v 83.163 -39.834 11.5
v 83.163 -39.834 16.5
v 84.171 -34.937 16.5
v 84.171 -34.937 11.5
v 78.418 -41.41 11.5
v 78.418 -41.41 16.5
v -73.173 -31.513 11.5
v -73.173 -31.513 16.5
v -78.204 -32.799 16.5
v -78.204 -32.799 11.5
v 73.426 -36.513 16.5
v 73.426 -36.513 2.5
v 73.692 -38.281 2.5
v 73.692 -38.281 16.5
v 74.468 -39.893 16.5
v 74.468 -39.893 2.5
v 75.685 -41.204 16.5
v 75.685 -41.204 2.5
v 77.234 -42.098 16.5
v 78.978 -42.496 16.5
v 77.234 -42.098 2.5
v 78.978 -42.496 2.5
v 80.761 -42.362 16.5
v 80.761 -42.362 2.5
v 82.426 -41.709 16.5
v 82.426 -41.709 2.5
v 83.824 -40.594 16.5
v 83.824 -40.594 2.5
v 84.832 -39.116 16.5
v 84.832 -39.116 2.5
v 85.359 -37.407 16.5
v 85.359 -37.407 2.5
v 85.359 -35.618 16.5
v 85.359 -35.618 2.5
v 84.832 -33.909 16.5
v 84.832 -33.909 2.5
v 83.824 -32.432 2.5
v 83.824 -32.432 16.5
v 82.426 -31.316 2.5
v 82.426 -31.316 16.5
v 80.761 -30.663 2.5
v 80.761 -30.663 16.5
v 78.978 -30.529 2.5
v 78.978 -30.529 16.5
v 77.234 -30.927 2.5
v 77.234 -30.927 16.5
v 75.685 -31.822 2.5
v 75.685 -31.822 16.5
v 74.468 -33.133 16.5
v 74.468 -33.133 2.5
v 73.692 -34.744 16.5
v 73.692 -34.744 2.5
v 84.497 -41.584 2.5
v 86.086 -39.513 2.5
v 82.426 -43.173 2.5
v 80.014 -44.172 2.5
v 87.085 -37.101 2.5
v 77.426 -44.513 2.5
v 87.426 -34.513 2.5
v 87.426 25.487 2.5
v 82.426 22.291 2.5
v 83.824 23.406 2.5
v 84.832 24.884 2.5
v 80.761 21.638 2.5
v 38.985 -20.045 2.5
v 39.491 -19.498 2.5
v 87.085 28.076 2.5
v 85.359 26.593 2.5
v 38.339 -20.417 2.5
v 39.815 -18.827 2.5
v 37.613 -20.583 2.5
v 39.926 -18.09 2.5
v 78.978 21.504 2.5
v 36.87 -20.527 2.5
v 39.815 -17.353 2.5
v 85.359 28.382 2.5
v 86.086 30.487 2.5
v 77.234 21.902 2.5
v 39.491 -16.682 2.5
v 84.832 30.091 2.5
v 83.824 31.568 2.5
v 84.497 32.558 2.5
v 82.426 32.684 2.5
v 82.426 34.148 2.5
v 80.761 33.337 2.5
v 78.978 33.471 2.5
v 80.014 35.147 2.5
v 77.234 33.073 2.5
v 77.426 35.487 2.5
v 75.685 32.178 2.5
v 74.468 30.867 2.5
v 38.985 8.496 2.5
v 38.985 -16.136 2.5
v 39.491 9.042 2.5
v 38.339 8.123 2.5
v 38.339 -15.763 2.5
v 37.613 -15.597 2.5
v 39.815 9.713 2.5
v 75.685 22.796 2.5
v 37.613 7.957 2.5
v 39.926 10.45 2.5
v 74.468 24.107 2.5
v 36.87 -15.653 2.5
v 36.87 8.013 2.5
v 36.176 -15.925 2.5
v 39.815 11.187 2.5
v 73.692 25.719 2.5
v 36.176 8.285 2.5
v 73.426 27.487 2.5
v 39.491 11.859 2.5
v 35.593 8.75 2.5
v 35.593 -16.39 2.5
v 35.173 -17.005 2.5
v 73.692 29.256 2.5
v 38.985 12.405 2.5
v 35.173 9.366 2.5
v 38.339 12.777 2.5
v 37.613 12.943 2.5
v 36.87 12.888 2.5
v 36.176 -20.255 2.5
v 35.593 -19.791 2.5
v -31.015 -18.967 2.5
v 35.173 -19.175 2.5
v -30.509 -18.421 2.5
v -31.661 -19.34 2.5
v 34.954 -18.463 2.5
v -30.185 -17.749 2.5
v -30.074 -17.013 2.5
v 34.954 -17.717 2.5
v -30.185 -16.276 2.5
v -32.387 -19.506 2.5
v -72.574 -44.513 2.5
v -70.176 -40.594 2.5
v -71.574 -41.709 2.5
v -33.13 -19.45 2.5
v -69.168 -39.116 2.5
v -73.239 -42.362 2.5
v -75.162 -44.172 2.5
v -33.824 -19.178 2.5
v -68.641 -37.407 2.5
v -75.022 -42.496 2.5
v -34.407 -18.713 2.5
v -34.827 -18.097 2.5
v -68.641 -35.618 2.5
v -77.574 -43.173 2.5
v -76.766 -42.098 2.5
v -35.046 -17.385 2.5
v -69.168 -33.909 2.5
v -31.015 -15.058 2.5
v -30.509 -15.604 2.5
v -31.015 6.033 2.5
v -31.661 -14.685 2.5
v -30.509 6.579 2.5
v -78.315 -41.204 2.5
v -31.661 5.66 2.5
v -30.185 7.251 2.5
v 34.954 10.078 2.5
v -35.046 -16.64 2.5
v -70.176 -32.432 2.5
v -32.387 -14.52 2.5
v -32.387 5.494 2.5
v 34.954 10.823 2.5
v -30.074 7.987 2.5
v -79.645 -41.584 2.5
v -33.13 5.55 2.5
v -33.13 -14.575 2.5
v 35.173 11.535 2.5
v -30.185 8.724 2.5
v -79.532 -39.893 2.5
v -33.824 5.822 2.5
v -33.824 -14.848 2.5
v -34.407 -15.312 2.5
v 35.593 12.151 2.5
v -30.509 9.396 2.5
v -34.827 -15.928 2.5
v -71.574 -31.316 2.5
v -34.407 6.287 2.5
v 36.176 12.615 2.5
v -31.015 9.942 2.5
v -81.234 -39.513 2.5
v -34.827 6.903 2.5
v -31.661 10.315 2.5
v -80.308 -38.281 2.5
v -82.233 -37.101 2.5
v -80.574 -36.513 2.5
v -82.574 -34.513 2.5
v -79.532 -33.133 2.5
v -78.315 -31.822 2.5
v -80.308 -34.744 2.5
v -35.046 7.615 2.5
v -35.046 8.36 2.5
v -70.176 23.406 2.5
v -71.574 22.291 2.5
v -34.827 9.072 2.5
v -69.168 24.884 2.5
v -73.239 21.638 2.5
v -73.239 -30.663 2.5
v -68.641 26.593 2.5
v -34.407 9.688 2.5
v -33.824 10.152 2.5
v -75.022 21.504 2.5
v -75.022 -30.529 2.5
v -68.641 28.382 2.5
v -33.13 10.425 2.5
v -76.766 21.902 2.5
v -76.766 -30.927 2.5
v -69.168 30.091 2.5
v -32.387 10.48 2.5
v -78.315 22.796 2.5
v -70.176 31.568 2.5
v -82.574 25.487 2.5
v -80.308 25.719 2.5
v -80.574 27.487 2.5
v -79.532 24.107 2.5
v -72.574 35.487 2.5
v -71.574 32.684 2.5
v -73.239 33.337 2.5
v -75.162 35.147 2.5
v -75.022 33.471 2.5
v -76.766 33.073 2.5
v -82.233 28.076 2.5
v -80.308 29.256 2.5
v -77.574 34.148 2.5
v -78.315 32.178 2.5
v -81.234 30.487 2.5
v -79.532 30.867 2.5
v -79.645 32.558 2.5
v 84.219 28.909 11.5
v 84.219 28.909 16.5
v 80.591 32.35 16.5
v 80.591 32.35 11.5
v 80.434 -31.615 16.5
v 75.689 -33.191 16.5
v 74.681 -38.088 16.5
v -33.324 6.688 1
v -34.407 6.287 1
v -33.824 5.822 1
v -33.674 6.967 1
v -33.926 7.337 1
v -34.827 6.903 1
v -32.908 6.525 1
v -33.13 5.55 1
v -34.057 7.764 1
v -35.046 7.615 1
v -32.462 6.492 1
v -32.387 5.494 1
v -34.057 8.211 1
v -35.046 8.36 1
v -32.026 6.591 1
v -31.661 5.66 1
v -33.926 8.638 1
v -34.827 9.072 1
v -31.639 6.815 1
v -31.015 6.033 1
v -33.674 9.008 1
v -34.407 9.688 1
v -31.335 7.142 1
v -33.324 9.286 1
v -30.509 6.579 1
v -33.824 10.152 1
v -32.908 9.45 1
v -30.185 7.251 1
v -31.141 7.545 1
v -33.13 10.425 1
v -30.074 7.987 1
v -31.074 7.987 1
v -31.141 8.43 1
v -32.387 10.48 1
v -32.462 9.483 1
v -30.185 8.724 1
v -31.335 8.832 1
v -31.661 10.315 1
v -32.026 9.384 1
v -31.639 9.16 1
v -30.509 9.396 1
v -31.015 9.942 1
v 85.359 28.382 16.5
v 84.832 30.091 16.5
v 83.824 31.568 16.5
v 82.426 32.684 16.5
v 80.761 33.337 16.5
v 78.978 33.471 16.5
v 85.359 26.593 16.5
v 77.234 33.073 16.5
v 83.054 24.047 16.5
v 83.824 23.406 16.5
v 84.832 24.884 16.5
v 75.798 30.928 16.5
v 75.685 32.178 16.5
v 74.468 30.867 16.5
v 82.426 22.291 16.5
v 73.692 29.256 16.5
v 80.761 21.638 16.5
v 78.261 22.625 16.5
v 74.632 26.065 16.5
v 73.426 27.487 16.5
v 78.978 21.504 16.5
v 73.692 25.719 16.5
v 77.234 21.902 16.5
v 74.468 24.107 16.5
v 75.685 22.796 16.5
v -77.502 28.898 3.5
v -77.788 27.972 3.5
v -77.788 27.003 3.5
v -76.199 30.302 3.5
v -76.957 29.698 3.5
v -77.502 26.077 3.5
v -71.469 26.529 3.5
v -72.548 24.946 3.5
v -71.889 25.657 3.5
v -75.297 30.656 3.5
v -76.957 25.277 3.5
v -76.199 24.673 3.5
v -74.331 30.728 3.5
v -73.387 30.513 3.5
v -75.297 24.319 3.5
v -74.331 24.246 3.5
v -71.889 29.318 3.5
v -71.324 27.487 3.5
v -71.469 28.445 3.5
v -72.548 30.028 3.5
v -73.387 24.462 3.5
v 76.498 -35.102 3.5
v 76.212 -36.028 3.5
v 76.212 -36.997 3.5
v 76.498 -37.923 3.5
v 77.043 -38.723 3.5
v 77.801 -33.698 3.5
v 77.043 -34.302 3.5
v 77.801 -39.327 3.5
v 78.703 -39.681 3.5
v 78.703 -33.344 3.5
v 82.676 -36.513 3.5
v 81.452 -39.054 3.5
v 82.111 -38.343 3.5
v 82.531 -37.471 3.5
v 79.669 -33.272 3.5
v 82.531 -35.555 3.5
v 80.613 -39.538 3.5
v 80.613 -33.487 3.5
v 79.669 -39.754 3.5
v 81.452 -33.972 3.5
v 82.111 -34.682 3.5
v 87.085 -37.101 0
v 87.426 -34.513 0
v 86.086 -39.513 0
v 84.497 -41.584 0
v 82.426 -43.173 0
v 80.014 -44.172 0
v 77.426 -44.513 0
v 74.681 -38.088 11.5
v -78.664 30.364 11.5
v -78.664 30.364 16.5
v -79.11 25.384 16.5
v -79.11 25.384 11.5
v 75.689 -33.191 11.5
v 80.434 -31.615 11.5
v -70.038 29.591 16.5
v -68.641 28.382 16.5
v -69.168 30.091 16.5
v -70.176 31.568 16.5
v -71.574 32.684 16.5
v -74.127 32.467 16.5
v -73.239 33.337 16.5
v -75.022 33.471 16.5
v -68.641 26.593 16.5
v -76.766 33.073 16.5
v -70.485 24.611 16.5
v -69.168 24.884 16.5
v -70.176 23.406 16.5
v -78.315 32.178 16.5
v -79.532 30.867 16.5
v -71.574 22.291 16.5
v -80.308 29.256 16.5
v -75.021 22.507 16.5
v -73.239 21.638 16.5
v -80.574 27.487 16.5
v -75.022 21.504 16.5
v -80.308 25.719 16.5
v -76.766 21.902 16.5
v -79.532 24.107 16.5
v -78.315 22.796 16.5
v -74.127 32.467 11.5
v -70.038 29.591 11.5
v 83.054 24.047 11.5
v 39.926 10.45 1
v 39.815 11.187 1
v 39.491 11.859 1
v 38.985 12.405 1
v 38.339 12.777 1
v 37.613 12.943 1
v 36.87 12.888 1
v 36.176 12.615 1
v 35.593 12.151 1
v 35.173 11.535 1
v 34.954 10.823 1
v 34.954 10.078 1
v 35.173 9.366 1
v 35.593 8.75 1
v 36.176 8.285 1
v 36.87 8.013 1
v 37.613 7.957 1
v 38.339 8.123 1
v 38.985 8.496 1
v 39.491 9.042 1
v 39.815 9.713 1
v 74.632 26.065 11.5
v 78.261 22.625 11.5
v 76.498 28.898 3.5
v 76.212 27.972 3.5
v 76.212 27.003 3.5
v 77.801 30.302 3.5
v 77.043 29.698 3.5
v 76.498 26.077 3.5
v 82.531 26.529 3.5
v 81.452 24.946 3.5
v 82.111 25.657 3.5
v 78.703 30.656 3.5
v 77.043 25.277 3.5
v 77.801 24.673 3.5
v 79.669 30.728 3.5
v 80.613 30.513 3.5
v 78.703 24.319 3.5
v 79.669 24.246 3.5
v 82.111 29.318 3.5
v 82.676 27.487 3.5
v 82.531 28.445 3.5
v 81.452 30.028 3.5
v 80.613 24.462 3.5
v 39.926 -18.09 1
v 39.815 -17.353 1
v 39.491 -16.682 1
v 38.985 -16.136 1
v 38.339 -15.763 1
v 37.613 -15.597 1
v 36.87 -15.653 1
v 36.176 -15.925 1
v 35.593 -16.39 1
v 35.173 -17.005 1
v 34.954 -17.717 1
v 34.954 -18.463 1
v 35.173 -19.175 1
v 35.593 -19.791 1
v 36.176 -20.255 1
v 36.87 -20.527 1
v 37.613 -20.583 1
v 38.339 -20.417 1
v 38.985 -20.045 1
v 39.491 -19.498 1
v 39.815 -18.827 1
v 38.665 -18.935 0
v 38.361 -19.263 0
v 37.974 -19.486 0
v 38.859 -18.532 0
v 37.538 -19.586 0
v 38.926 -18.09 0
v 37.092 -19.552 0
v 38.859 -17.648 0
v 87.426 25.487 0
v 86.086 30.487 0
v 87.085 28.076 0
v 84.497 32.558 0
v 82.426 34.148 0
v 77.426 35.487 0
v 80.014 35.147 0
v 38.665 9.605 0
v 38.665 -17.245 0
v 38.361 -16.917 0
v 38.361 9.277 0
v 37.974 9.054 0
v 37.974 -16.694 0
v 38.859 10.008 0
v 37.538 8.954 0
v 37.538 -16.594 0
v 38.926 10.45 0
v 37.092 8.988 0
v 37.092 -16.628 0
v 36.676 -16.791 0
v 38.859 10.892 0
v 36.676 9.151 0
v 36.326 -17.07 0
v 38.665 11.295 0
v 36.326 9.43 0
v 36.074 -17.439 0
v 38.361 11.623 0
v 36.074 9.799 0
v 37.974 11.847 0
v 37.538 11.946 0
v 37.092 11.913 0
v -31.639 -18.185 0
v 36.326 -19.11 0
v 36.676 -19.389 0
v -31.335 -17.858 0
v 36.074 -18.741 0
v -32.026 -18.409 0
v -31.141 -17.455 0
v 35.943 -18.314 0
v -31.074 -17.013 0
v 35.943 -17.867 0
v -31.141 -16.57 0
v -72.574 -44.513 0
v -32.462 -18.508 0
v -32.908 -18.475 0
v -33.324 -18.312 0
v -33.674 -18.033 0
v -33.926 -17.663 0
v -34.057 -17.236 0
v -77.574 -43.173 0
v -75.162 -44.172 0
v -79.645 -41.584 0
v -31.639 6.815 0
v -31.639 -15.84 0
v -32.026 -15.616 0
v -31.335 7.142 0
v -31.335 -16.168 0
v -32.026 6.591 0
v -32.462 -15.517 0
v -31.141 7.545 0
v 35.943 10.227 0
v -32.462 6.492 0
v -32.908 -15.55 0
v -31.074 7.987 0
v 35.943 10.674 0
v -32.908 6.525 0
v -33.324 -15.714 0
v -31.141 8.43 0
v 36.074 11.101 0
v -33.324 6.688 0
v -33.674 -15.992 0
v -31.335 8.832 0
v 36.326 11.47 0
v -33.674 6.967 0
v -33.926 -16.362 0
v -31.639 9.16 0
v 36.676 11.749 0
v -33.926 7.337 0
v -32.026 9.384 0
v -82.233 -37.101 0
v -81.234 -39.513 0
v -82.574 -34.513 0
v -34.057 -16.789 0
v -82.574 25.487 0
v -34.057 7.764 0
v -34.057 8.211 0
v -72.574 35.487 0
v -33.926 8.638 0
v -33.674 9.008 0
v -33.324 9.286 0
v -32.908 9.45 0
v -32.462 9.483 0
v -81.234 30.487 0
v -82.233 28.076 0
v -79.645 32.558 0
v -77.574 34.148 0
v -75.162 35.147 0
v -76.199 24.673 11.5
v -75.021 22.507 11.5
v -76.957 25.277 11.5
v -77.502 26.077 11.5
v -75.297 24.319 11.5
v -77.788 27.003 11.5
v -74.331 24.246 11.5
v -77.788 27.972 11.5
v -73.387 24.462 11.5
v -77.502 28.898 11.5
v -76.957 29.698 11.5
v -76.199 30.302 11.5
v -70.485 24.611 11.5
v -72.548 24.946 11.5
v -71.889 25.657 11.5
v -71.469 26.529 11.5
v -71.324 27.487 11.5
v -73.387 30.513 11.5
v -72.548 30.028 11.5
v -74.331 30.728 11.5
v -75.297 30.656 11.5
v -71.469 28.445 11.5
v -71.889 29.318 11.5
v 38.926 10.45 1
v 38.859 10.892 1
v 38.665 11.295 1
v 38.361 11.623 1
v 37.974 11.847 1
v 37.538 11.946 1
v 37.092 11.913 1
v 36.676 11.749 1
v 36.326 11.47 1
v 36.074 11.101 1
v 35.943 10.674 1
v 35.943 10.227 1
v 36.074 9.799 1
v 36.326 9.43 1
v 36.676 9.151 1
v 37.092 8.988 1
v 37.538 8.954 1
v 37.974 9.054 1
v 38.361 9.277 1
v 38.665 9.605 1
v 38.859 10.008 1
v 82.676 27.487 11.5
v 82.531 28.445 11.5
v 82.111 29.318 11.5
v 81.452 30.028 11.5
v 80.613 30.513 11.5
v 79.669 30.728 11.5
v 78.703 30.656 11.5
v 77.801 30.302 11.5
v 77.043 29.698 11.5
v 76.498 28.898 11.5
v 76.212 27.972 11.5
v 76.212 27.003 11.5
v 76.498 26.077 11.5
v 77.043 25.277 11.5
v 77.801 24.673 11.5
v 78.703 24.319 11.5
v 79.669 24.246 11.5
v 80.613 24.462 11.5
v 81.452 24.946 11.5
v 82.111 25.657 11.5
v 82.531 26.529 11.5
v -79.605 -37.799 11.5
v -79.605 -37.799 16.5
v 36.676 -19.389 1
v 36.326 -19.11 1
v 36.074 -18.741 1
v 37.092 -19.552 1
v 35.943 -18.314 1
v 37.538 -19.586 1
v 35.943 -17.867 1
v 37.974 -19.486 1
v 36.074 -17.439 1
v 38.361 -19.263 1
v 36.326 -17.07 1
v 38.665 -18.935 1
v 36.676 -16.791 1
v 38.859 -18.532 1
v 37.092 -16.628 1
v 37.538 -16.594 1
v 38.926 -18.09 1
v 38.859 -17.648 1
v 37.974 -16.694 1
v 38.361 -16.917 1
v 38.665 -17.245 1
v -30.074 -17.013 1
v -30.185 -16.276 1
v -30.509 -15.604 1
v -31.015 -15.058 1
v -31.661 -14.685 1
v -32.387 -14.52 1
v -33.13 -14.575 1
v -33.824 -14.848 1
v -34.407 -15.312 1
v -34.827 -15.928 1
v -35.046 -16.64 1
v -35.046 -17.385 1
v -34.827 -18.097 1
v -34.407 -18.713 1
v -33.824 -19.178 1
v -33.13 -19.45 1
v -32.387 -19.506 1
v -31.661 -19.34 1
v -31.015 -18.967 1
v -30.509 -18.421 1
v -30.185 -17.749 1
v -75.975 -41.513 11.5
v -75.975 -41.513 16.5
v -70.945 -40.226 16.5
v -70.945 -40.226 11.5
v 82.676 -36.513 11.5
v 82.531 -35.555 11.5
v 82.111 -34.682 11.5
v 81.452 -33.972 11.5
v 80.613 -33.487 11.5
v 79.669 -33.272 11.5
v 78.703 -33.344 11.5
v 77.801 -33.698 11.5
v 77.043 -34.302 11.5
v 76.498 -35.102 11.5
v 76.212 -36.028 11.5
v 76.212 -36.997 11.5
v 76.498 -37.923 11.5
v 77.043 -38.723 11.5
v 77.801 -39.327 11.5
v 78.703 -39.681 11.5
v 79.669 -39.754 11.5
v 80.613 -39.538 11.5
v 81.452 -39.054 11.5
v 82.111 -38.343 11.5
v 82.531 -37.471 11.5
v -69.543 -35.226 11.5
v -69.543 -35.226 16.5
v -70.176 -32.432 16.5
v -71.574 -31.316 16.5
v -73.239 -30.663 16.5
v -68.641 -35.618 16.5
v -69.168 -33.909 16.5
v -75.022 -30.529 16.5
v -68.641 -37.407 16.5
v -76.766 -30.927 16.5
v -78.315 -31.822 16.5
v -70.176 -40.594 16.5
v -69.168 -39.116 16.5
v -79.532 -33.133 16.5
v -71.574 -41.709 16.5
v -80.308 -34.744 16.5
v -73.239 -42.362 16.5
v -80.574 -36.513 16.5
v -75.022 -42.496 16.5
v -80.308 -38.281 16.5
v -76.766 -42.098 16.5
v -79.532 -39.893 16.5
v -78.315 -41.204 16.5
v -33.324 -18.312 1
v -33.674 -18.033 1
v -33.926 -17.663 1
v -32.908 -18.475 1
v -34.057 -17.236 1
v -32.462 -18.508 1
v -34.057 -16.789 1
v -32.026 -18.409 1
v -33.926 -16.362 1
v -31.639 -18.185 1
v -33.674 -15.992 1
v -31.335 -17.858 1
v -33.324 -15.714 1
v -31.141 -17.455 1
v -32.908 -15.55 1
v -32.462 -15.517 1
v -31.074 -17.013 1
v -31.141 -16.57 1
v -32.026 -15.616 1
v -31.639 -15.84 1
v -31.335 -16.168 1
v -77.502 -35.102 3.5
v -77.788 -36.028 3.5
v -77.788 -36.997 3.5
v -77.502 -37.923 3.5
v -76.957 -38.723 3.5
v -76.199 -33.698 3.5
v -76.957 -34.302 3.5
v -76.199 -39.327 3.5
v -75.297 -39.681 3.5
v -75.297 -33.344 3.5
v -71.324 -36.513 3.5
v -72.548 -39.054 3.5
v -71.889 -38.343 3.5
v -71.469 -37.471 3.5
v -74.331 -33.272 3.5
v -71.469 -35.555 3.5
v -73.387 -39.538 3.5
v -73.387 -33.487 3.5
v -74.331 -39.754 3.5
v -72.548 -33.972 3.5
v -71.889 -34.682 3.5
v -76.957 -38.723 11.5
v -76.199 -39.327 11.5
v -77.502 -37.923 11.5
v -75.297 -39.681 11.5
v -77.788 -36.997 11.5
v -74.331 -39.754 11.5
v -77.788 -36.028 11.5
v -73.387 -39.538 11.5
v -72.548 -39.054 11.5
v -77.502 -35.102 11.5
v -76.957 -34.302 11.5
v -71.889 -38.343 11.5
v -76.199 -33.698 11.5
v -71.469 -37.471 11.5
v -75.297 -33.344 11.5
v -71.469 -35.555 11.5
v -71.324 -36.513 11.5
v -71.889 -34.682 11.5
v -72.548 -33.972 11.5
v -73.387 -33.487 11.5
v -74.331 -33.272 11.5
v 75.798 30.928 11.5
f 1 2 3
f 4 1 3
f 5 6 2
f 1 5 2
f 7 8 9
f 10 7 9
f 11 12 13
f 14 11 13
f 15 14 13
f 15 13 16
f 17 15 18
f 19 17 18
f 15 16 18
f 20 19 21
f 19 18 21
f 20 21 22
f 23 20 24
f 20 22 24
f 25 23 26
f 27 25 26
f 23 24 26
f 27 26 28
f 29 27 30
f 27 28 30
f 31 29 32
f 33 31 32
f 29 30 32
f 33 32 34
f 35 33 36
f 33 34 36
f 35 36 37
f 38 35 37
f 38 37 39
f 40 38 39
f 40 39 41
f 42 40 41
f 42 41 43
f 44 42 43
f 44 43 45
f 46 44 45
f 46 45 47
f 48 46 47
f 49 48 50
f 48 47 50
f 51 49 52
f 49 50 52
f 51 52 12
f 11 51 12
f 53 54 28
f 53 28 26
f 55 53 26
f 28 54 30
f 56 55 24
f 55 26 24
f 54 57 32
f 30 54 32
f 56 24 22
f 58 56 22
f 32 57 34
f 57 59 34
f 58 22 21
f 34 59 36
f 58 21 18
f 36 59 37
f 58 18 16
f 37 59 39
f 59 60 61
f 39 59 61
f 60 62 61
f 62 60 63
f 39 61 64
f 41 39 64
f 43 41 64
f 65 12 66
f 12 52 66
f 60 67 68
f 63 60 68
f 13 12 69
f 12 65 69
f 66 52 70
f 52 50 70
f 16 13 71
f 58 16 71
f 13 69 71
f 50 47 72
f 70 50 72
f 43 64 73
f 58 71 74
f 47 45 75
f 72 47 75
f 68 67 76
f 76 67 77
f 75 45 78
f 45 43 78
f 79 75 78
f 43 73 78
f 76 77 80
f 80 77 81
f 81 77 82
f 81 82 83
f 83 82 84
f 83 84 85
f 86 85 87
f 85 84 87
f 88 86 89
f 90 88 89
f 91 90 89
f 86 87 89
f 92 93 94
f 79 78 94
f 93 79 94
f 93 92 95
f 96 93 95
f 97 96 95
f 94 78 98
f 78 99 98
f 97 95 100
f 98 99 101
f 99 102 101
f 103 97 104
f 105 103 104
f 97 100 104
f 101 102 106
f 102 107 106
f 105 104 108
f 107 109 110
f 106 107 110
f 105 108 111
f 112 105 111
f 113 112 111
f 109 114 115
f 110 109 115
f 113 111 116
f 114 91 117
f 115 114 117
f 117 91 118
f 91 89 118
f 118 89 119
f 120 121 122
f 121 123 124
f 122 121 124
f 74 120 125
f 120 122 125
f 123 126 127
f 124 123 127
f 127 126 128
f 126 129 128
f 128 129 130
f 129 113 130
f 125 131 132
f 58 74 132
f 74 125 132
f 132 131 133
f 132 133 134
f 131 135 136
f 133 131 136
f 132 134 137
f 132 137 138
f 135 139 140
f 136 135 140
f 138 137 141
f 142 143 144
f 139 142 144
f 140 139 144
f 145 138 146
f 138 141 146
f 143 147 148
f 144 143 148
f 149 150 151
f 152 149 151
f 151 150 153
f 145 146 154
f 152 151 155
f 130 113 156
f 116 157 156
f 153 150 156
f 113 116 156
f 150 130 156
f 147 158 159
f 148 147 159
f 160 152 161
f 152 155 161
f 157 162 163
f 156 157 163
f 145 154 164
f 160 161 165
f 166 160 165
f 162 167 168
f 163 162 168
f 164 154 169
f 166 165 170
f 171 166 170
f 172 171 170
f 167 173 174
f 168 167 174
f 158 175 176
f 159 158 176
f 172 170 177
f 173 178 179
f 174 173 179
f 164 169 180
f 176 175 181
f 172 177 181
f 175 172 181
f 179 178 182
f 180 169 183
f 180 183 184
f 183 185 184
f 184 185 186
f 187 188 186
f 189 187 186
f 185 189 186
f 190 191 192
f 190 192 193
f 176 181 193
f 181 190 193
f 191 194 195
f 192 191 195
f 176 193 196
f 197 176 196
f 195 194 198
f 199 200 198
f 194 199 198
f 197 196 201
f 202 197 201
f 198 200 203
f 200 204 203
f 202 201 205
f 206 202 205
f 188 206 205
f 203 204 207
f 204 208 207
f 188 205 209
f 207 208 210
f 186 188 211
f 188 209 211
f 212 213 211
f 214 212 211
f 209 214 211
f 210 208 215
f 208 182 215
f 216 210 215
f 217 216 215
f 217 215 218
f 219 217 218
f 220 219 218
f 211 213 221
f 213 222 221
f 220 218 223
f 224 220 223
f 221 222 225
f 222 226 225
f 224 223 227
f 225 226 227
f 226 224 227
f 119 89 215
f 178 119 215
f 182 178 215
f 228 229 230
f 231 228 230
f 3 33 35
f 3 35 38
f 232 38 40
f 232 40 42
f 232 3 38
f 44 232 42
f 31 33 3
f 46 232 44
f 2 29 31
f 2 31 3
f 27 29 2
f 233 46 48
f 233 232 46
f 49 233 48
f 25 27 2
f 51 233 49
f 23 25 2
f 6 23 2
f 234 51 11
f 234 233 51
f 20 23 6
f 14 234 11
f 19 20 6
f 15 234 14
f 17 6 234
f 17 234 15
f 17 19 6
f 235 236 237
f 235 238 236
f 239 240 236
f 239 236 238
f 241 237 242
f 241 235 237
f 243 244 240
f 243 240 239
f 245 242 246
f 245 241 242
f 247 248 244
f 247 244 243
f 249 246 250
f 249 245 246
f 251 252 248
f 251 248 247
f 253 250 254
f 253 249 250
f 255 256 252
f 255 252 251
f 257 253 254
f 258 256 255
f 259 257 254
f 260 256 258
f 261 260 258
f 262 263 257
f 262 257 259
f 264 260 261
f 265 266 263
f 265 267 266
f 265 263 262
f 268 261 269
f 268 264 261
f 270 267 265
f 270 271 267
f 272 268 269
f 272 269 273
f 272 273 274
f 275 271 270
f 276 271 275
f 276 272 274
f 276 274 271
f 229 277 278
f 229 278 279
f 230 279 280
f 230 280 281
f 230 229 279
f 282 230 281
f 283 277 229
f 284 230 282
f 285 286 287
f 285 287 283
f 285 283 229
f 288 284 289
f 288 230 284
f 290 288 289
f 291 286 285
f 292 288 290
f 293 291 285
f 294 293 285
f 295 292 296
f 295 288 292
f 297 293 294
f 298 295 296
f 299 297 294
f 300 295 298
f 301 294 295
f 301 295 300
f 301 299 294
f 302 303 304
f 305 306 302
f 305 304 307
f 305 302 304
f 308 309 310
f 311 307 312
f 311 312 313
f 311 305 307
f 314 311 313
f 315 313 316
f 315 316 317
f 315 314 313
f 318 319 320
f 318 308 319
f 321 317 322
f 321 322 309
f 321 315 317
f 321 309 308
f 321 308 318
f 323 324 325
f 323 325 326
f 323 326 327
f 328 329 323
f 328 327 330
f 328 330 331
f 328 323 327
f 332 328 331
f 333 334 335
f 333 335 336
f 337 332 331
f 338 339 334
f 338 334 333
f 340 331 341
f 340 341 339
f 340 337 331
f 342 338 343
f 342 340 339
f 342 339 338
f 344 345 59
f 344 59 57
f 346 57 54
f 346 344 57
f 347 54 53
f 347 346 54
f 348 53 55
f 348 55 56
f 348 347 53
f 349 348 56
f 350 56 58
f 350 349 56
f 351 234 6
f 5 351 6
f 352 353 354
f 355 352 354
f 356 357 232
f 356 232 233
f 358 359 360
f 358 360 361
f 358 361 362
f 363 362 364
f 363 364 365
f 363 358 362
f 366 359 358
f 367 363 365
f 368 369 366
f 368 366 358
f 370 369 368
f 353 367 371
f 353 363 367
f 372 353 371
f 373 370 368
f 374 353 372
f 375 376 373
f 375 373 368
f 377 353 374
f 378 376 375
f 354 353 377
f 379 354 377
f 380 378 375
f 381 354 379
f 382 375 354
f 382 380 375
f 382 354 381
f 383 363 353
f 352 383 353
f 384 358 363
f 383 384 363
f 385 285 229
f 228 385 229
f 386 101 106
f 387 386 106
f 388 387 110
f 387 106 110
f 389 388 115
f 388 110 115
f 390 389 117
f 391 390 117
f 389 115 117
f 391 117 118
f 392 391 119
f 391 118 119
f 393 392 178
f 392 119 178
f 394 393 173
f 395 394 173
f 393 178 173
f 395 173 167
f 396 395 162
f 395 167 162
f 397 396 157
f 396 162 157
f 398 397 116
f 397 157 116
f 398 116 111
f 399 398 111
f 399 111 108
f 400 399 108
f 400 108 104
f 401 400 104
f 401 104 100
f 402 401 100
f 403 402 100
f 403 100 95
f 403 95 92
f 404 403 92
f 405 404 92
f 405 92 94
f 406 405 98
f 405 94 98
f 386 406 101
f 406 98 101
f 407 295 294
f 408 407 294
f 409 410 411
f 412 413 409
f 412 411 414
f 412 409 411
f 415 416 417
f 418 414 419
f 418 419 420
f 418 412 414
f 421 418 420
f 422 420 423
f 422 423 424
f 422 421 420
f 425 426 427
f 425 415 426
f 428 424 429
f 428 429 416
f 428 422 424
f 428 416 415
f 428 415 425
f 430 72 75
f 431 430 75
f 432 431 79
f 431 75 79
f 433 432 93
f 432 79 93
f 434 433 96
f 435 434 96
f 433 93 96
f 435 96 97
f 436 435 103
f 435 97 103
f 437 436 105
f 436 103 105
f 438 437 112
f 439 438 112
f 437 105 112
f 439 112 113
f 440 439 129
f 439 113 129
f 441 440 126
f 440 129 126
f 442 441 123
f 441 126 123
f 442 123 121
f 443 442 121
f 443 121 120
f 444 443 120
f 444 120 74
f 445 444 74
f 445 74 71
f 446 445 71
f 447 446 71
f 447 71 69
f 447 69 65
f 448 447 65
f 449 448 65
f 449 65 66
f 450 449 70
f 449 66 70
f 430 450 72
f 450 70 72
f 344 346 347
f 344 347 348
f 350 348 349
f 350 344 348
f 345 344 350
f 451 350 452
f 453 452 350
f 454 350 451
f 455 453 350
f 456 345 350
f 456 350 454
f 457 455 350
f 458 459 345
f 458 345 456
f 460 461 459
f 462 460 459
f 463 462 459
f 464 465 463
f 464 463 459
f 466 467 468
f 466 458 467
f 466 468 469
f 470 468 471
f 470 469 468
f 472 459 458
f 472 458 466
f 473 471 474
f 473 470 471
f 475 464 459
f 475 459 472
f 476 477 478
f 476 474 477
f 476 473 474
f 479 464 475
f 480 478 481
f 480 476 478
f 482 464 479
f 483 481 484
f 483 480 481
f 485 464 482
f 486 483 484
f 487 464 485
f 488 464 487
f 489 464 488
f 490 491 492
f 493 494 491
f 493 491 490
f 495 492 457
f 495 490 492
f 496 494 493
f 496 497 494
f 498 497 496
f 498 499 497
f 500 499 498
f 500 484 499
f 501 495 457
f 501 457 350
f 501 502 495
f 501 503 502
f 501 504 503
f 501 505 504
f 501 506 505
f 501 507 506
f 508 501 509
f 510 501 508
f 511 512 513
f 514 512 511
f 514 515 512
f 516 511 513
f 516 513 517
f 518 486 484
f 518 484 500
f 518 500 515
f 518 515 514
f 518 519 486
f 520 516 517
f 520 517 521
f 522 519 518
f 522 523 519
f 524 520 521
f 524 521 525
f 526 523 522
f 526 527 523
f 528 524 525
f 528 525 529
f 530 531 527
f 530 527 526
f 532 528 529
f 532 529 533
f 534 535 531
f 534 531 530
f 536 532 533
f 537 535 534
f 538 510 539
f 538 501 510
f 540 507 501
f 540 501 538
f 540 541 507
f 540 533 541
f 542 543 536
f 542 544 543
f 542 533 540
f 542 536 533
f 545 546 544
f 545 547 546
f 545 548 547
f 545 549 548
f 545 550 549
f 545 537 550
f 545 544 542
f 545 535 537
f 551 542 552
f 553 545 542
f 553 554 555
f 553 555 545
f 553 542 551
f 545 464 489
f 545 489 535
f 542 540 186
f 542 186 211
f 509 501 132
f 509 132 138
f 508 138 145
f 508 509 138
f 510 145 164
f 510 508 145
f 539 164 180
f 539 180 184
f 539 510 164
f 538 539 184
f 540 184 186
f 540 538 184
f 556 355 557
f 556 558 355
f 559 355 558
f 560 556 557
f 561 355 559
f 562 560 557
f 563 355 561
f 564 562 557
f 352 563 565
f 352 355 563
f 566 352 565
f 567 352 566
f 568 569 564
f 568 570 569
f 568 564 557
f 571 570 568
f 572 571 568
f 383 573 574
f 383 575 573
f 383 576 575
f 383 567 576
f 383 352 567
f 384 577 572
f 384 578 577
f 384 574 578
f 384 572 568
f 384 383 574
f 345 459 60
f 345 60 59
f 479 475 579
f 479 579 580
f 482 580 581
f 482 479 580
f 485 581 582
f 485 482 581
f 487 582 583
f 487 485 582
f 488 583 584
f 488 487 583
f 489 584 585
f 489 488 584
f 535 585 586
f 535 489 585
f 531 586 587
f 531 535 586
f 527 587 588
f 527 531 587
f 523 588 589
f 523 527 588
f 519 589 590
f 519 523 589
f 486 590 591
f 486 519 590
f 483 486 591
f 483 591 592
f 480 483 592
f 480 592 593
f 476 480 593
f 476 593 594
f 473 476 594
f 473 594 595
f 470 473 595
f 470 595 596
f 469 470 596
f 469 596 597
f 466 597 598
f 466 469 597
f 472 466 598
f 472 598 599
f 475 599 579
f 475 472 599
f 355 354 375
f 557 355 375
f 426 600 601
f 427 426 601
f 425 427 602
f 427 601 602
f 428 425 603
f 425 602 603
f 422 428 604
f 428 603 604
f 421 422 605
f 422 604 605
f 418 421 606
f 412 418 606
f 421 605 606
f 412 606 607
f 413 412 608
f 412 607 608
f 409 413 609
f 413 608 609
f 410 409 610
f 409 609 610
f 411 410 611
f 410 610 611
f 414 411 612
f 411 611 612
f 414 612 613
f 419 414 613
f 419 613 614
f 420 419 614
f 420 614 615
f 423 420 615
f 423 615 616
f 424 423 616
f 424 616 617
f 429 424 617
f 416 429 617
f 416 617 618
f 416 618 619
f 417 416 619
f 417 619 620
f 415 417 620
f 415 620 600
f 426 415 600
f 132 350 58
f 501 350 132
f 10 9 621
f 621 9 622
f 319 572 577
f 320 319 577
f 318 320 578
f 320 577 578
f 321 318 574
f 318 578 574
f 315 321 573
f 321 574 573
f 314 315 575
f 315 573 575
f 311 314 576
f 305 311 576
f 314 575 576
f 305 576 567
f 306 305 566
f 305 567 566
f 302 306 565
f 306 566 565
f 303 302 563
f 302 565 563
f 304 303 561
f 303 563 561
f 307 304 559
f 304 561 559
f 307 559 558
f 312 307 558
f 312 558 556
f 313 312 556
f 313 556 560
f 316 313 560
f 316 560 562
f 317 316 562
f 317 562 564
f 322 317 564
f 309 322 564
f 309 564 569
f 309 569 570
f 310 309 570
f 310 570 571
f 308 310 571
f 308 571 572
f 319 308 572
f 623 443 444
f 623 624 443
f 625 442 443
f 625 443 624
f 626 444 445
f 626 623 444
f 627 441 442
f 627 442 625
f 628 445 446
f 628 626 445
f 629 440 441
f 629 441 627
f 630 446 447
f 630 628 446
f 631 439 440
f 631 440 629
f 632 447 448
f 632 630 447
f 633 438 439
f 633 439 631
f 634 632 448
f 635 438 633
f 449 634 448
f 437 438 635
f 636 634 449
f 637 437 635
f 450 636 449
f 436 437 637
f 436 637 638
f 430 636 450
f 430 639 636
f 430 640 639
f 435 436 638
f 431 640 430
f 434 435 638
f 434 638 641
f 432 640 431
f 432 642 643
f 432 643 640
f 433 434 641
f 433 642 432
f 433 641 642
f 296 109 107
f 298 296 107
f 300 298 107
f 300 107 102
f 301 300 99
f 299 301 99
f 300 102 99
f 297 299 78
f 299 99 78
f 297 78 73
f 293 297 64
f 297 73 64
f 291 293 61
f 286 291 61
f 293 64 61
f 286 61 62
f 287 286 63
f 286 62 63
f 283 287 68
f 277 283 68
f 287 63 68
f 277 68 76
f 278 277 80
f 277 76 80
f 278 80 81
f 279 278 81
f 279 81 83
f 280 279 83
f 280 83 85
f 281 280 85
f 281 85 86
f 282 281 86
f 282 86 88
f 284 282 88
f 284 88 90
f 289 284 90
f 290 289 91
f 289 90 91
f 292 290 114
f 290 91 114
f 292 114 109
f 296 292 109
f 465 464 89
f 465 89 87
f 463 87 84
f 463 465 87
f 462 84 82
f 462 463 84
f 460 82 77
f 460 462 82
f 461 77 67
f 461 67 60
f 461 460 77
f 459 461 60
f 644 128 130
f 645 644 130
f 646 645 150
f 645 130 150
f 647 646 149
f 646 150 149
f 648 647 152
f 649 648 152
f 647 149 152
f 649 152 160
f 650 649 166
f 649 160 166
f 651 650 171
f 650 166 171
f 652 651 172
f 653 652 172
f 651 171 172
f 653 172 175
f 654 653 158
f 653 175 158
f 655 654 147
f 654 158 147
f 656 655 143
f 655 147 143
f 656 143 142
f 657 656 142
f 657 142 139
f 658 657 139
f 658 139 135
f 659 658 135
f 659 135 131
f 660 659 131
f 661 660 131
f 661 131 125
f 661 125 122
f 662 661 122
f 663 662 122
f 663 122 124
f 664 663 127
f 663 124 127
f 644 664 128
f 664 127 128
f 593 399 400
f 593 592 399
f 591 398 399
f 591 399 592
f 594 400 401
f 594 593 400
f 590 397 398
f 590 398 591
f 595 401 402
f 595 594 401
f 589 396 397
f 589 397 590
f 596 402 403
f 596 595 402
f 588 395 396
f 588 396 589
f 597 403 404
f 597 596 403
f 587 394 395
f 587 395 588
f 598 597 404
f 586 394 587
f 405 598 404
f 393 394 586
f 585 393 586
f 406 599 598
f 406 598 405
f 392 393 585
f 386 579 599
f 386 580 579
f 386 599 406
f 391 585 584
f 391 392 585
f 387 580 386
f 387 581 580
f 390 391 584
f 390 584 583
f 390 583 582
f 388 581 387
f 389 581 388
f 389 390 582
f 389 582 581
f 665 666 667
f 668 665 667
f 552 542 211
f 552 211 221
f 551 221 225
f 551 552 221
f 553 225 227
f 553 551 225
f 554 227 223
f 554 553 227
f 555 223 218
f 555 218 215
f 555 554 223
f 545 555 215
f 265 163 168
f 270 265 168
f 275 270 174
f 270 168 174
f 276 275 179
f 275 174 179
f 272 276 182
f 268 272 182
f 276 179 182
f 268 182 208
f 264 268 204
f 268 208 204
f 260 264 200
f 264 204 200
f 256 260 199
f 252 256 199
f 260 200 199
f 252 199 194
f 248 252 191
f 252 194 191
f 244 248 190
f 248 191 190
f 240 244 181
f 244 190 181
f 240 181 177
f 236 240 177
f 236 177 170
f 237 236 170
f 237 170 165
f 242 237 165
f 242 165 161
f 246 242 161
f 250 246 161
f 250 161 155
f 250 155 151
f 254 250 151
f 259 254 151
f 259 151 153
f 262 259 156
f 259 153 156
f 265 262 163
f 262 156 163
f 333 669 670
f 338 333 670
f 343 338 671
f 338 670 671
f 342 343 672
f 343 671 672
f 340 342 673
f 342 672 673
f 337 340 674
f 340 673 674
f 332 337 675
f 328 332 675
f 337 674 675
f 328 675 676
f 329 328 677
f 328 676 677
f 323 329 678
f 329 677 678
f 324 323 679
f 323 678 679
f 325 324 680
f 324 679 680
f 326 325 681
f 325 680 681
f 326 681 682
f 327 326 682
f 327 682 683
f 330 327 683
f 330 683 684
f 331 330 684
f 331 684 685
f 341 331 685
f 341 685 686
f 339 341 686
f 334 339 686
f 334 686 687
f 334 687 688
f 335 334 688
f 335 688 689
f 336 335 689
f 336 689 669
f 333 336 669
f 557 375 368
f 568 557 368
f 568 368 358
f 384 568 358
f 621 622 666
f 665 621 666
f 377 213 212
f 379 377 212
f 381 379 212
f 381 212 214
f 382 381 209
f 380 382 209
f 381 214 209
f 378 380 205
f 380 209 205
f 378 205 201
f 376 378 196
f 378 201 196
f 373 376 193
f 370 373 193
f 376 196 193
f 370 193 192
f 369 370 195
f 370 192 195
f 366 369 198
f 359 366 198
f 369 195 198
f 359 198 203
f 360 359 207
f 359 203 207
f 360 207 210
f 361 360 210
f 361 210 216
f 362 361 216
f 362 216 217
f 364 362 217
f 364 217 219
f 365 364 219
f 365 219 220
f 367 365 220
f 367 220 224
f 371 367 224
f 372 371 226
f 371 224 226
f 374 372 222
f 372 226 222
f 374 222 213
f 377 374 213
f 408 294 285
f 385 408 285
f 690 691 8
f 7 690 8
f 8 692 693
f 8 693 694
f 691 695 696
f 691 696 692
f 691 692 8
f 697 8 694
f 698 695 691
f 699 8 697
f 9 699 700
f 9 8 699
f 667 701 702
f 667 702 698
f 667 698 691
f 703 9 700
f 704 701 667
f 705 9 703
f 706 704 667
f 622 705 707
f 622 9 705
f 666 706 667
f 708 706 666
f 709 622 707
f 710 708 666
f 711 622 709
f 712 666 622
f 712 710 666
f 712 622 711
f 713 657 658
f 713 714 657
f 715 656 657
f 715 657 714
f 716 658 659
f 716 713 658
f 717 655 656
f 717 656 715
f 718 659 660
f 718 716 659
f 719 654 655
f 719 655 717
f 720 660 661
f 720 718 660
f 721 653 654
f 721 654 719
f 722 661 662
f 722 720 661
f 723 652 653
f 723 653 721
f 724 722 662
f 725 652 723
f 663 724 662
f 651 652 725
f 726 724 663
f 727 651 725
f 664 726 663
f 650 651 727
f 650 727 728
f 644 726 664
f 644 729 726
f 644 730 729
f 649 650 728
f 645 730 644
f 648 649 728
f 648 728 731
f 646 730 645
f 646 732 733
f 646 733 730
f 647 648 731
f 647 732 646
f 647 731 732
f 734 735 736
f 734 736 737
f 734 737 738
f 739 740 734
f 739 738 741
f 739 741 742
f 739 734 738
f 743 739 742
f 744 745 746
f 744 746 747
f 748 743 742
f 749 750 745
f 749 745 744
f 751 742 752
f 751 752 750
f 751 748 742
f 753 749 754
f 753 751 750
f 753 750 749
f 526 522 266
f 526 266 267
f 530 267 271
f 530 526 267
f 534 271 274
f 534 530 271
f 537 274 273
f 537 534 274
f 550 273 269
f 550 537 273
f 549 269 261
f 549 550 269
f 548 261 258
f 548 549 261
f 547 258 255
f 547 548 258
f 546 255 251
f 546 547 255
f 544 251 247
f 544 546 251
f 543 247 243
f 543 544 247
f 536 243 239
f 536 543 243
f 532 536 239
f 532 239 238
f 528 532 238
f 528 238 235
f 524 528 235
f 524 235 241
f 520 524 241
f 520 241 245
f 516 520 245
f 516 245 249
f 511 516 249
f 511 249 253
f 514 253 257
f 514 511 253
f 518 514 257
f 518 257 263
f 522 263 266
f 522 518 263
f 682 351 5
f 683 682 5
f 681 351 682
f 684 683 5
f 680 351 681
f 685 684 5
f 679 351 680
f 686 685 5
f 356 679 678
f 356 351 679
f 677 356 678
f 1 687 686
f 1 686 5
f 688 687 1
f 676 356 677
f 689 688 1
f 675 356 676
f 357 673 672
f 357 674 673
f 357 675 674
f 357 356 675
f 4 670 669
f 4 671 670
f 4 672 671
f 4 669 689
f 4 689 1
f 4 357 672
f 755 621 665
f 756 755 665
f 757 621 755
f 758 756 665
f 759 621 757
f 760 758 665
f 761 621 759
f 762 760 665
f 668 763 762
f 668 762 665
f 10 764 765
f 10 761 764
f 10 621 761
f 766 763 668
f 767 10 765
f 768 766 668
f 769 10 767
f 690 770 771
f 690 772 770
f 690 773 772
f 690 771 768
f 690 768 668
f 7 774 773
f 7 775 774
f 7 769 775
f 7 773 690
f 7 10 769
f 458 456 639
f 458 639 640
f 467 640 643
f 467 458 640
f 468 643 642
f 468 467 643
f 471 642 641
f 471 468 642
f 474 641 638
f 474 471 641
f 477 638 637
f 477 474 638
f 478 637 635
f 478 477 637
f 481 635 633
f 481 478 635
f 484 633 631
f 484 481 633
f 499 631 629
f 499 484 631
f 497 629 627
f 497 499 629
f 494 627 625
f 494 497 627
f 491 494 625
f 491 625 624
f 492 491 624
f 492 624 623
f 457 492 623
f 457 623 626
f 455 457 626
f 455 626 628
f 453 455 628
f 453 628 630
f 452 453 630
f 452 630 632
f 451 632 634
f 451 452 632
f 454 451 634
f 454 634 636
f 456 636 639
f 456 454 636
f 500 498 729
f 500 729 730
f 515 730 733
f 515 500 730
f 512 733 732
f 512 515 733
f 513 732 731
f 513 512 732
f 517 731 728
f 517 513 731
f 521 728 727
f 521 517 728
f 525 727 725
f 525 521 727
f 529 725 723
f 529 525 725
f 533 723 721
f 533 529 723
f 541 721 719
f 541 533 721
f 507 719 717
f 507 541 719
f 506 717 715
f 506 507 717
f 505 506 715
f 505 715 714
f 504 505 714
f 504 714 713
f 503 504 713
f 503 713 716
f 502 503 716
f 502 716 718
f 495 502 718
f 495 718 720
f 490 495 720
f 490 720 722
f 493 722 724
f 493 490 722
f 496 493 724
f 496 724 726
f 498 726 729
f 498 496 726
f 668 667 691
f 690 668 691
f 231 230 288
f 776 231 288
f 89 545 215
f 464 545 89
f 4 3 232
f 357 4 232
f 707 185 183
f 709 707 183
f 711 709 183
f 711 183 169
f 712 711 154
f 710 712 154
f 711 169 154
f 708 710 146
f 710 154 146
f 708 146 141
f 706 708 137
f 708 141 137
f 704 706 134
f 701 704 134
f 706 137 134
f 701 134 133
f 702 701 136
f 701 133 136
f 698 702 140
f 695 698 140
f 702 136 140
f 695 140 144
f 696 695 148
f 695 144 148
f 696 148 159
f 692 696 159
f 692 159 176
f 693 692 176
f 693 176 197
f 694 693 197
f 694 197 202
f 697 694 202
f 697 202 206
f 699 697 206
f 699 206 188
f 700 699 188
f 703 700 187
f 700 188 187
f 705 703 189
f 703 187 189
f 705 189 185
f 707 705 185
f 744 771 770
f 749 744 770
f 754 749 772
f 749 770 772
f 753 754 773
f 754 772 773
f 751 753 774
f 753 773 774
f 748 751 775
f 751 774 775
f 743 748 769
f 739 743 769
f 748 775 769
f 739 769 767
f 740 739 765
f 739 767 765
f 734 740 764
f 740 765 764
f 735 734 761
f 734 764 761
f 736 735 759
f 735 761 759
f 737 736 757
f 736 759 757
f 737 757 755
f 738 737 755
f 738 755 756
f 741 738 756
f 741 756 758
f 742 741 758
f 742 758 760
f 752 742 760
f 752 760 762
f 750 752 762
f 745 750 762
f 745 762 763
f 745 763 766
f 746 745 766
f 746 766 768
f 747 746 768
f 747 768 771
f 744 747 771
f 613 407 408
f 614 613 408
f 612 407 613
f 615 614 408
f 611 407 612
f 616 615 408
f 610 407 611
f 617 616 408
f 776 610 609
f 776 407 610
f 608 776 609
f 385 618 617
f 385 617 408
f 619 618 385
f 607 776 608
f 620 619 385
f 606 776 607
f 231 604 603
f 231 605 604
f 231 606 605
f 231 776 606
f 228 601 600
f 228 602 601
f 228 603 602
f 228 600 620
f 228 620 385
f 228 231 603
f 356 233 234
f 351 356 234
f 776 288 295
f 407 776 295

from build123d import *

# Parameters (mm, degrees)
EXTRUDE_1_DEPTH          = 2.5
CUT_EXTRUDE_1_DEPTH      = 42
CUT_EXTRUDE_1_DEPTH_BACK = 10
SKETCH_2_R               = 1.5
SKETCH_3_R               = 2.5
CUT_EXTRUDE_2_DEPTH      = 1.5
SKETCH_7_R               = 6
EXTRUDE_4_DEPTH          = 14
BUTTON_LEFT_NUT_DEPTH    = 5
UP_LEFT_NUT_DEPTH        = 5
UP_RIGHT_NUT_DEPTH       = 5
BUTTON_RIGHT_NUT_DEPTH   = 5
SKETCH_13_R              = 3.25
CUT_EXTRUDE_7_DEPTH      = 13
SKETCH_15_R              = 3.25
CUT_EXTRUDE_8_DEPTH      = 13
SKETCH_16_R              = 3.25
CUT_EXTRUDE_9_DEPTH      = 13
SKETCH_17_R              = 3.25
CUT_EXTRUDE_10_DEPTH     = 13


with BuildPart() as part:
    # 草图1 → 凸台-拉伸1 (new body)
    with BuildSketch(Plane.XY):
        with BuildLine():
            Line((-72.574116531, 35.487390308), (77.425883469, 35.487390308))
            ThreePointArc((77.425883469, 35.487390308), (84.496951281, 32.558458119), (87.425883469, 25.487390308))
            Line((87.425883469, 25.487390308), (87.425883469, -34.512609692))
            ThreePointArc((87.425883469, -34.512609692), (84.496951281, -41.583677504), (77.425883469, -44.512609692))
            Line((77.425883469, -44.512609692), (-72.574116531, -44.512609692))
            ThreePointArc((-72.574116531, -44.512609692), (-79.645184343, -41.583677504), (-82.574116531, -34.512609692))
            Line((-82.574116531, -34.512609692), (-82.574116531, 25.487390308))
            ThreePointArc((-82.574116531, 25.487390308), (-79.645184343, 32.558458119), (-72.574116531, 35.487390308))
        make_face()
    extrude(amount=EXTRUDE_1_DEPTH)

    # 草图2 → 切除-拉伸1 (cut, two sides: drawn at the far end of the back side and taken through both)
    with BuildSketch(Plane.XY.offset(2.5).offset(-CUT_EXTRUDE_1_DEPTH_BACK)):
        with Locations((-32.574116531, 7.987390308)):
            Circle(SKETCH_2_R)
        with Locations((-32.574116531, -17.012609692)):
            Circle(SKETCH_2_R)
        with Locations((37.425883469, 10.450230815)):
            Circle(SKETCH_2_R)
        with Locations((37.425883469, -18.090102414)):
            Circle(SKETCH_2_R)
    extrude(amount=CUT_EXTRUDE_1_DEPTH + CUT_EXTRUDE_1_DEPTH_BACK, mode=Mode.SUBTRACT)

    # 草图3 → 切除-拉伸2 (cut)
    with BuildSketch(Plane.XY.offset(2.5)):
        with Locations((-32.574116531, 7.987390308)):
            Circle(SKETCH_3_R)
        with Locations((37.425883469, 10.450230815)):
            Circle(SKETCH_3_R)
        with Locations((37.425883469, -18.090102414)):
            Circle(SKETCH_3_R)
        with Locations((-32.574116531, -17.012609692)):
            Circle(SKETCH_3_R)
    extrude(amount=-CUT_EXTRUDE_2_DEPTH, mode=Mode.SUBTRACT)

    # 草图7 → 凸台-拉伸4 (add)
    with BuildSketch(Plane.XY.offset(2.5)):
        with Locations(Location((-74.574116531, 27.487390308, 0), (0, 0, 180))):
            Circle(SKETCH_7_R)
        with Locations(Location((-74.574116531, -36.512609692, 0), (0, 0, 180))):
            Circle(SKETCH_7_R)
        with Locations(Location((79.425883469, 27.487390308, 0), (0, 0, 180))):
            Circle(SKETCH_7_R)
        with Locations(Location((79.425883469, -36.512609692, 0), (0, 0, 180))):
            Circle(SKETCH_7_R)
    extrude(amount=EXTRUDE_4_DEPTH)

    # 草图9 → button left nut (cut)
    with BuildSketch(Plane.XY.offset(16.5)):
        Polygon((-70.944636645, -40.226166125), (-69.543342379, -35.226166125), (-73.172822265, -31.512609692), (-78.203596417, -32.79905326), (-79.604890683, -37.79905326), (-75.975410797, -41.512609692), align=None)
    extrude(amount=-BUTTON_LEFT_NUT_DEPTH, mode=Mode.SUBTRACT)

    # 草图10 → up left nut (cut)
    with BuildSketch(Plane.XY.offset(16.5)):
        Polygon((-70.484611493, 24.610595469), (-70.0379866, 29.59060814), (-74.127491638, 32.467402979), (-78.663621569, 30.364185146), (-79.110246462, 25.384172475), (-75.020741423, 22.507377636), align=None)
    extrude(amount=-UP_LEFT_NUT_DEPTH, mode=Mode.SUBTRACT)

    # 草图11 → up right nut (cut)
    with BuildSketch(Plane.XY.offset(16.5)):
        Polygon((83.054173559, 24.047112554), (84.219396445, 28.909442821), (80.591106355, 32.349720575), (75.797593379, 30.927668061), (74.632370493, 26.065337794), (78.260660583, 22.62506004), align=None)
    extrude(amount=-UP_RIGHT_NUT_DEPTH, mode=Mode.SUBTRACT)

    # 草图12 → button right nut (cut)
    with BuildSketch(Plane.XY.offset(16.5)):
        Polygon((83.162930062, -39.834428887), (84.171186575, -34.937142005), (80.434139981, -31.61532281), (75.688836876, -33.190790498), (74.680580363, -38.08807738), (78.417626957, -41.409896575), align=None)
    extrude(amount=-BUTTON_RIGHT_NUT_DEPTH, mode=Mode.SUBTRACT)

    # 草图13 → 切除-拉伸7 (cut)
    with BuildSketch(Plane.XY.offset(16.5)):
        with Locations((-74.574116531, -36.512609692)):
            Circle(SKETCH_13_R)
    extrude(amount=-CUT_EXTRUDE_7_DEPTH, mode=Mode.SUBTRACT)

    # 草图15 → 切除-拉伸8 (cut)
    with BuildSketch(Plane.XY.offset(16.5)):
        with Locations((-74.574116531, 27.487390308)):
            Circle(SKETCH_15_R)
    extrude(amount=-CUT_EXTRUDE_8_DEPTH, mode=Mode.SUBTRACT)

    # 草图16 → 切除-拉伸9 (cut)
    with BuildSketch(Plane.XY.offset(16.5)):
        with Locations((79.425883469, 27.487390308)):
            Circle(SKETCH_16_R)
    extrude(amount=-CUT_EXTRUDE_9_DEPTH, mode=Mode.SUBTRACT)

    # 草图17 → 切除-拉伸10 (cut)
    with BuildSketch(Plane.XY.offset(16.5)):
        with Locations((79.425883469, -36.512609692)):
            Circle(SKETCH_17_R)
    extrude(amount=-CUT_EXTRUDE_10_DEPTH, mode=Mode.SUBTRACT)


solid = part.part
